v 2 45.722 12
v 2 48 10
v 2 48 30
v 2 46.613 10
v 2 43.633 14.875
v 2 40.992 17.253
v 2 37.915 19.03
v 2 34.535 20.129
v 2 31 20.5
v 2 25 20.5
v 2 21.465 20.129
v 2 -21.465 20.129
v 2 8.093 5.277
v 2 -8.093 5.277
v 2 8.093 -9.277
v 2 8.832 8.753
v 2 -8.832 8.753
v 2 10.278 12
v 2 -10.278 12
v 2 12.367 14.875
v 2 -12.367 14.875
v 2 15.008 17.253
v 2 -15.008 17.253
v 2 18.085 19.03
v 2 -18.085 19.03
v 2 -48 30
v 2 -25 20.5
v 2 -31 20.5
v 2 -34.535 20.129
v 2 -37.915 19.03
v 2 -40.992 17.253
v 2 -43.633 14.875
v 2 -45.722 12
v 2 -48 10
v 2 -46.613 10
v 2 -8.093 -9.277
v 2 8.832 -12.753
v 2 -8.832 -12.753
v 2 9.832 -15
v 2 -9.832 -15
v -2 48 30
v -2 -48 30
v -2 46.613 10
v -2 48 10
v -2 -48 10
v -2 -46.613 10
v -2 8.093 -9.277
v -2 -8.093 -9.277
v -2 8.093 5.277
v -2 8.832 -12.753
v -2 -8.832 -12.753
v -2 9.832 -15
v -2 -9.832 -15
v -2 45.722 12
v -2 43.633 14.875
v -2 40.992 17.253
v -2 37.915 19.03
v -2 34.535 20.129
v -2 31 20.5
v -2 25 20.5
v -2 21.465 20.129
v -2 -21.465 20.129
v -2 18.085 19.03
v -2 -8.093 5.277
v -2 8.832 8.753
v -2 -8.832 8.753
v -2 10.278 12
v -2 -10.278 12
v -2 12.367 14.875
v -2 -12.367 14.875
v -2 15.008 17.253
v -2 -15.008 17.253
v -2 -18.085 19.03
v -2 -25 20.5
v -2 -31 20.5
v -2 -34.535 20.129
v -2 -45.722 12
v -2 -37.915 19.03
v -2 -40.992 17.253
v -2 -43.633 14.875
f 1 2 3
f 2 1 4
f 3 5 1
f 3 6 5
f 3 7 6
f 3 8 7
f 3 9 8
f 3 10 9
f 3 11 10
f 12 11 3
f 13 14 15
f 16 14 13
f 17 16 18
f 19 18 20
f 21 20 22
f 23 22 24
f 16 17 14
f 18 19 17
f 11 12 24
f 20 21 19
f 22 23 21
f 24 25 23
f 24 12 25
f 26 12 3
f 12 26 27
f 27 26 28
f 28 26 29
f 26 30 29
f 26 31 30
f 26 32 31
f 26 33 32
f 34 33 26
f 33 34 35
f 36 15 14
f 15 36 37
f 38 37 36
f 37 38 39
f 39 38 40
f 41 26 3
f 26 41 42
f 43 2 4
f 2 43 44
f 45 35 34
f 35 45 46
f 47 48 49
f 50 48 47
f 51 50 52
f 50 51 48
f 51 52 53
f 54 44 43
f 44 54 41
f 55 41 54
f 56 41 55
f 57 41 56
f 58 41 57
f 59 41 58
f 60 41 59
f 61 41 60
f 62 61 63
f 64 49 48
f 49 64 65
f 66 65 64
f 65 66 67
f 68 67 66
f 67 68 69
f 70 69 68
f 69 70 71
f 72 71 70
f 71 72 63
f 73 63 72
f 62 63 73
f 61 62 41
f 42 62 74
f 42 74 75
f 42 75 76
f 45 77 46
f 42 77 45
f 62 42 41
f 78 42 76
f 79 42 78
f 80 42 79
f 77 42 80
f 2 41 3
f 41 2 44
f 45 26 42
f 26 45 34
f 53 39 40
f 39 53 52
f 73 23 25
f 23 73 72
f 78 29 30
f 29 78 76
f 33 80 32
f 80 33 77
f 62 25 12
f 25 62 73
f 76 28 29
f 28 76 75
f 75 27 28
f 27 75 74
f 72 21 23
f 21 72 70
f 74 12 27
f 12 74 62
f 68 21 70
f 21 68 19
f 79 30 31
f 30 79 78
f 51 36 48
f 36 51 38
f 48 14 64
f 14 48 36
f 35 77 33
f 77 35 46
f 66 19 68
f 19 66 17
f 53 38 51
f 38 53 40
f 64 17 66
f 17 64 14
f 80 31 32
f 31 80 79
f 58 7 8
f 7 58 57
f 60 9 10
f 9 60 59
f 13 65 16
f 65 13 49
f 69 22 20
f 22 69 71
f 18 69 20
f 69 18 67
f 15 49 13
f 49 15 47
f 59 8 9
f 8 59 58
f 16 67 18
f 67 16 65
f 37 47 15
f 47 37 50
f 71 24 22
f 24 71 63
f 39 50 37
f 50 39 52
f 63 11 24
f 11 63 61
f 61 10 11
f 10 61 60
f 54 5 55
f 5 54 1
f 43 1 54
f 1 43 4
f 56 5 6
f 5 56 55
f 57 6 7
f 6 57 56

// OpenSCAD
// file: roundbox.scad
module roundedRectUp(size, radius)
{
    x = size[0];
    y = size[1];
    z = size[2];

    linear_extrude(height=z)
    hull()
    {
        // place 4 circles in the corners, with the given radius
        translate([(-x/2)+(radius/2), (-y/2)+(radius/2), 0])
        circle(r=radius);

        translate([(x/2)-(radius/2), (-y/2)+(radius/2), 0])
        circle(r=radius);

        translate([(-x/2)+(radius/2), (y/2)-(radius/2), 0])
        circle(r=radius);

        translate([(x/2)-(radius/2), (y/2)-(radius/2), 0])
        circle(r=radius);
    }
}

module roundedRect(size, radius, center=false) 
{
    if( center) {
        translate([ 0, 0, -size[2]/2])
        roundedRectUp(size, radius);
    }
    else {
        roundedRectUp(size, radius);
    }
}


// example
roundedRect([20, 10, 1], 3, true);
// main file
use <roundbox.scad>

module copy_mirror(vec=[0,1,0])
{
    children();
    mirror(vec) children();
} 

module T() {
difference() 
    {
  union(){
    translate([0, 0, 20])
    cube([4, 96, 20], center=true);
  
    cube([4, 50, 60], center=true);
  }

    copy_mirror()
    color("red")    
    translate([ 0, -28, -8])
    rotate([ 0, 90, 0])
    roundedRect([45, 23,  10], 17, true);
    }
}

module T2() {
difference() 
    {
  union(){
    translate([0, 0, 20])
    cube([4, 96, 20], center=true);
  
    cube([4, 50, 30], center=true);
  }

    copy_mirror()
    color("red")    
    translate([ 0, -28, -2])
    rotate([ 0, 90, 0])
    roundedRect([28, 23,  10], 17, true);
    }
}
 
T2();
